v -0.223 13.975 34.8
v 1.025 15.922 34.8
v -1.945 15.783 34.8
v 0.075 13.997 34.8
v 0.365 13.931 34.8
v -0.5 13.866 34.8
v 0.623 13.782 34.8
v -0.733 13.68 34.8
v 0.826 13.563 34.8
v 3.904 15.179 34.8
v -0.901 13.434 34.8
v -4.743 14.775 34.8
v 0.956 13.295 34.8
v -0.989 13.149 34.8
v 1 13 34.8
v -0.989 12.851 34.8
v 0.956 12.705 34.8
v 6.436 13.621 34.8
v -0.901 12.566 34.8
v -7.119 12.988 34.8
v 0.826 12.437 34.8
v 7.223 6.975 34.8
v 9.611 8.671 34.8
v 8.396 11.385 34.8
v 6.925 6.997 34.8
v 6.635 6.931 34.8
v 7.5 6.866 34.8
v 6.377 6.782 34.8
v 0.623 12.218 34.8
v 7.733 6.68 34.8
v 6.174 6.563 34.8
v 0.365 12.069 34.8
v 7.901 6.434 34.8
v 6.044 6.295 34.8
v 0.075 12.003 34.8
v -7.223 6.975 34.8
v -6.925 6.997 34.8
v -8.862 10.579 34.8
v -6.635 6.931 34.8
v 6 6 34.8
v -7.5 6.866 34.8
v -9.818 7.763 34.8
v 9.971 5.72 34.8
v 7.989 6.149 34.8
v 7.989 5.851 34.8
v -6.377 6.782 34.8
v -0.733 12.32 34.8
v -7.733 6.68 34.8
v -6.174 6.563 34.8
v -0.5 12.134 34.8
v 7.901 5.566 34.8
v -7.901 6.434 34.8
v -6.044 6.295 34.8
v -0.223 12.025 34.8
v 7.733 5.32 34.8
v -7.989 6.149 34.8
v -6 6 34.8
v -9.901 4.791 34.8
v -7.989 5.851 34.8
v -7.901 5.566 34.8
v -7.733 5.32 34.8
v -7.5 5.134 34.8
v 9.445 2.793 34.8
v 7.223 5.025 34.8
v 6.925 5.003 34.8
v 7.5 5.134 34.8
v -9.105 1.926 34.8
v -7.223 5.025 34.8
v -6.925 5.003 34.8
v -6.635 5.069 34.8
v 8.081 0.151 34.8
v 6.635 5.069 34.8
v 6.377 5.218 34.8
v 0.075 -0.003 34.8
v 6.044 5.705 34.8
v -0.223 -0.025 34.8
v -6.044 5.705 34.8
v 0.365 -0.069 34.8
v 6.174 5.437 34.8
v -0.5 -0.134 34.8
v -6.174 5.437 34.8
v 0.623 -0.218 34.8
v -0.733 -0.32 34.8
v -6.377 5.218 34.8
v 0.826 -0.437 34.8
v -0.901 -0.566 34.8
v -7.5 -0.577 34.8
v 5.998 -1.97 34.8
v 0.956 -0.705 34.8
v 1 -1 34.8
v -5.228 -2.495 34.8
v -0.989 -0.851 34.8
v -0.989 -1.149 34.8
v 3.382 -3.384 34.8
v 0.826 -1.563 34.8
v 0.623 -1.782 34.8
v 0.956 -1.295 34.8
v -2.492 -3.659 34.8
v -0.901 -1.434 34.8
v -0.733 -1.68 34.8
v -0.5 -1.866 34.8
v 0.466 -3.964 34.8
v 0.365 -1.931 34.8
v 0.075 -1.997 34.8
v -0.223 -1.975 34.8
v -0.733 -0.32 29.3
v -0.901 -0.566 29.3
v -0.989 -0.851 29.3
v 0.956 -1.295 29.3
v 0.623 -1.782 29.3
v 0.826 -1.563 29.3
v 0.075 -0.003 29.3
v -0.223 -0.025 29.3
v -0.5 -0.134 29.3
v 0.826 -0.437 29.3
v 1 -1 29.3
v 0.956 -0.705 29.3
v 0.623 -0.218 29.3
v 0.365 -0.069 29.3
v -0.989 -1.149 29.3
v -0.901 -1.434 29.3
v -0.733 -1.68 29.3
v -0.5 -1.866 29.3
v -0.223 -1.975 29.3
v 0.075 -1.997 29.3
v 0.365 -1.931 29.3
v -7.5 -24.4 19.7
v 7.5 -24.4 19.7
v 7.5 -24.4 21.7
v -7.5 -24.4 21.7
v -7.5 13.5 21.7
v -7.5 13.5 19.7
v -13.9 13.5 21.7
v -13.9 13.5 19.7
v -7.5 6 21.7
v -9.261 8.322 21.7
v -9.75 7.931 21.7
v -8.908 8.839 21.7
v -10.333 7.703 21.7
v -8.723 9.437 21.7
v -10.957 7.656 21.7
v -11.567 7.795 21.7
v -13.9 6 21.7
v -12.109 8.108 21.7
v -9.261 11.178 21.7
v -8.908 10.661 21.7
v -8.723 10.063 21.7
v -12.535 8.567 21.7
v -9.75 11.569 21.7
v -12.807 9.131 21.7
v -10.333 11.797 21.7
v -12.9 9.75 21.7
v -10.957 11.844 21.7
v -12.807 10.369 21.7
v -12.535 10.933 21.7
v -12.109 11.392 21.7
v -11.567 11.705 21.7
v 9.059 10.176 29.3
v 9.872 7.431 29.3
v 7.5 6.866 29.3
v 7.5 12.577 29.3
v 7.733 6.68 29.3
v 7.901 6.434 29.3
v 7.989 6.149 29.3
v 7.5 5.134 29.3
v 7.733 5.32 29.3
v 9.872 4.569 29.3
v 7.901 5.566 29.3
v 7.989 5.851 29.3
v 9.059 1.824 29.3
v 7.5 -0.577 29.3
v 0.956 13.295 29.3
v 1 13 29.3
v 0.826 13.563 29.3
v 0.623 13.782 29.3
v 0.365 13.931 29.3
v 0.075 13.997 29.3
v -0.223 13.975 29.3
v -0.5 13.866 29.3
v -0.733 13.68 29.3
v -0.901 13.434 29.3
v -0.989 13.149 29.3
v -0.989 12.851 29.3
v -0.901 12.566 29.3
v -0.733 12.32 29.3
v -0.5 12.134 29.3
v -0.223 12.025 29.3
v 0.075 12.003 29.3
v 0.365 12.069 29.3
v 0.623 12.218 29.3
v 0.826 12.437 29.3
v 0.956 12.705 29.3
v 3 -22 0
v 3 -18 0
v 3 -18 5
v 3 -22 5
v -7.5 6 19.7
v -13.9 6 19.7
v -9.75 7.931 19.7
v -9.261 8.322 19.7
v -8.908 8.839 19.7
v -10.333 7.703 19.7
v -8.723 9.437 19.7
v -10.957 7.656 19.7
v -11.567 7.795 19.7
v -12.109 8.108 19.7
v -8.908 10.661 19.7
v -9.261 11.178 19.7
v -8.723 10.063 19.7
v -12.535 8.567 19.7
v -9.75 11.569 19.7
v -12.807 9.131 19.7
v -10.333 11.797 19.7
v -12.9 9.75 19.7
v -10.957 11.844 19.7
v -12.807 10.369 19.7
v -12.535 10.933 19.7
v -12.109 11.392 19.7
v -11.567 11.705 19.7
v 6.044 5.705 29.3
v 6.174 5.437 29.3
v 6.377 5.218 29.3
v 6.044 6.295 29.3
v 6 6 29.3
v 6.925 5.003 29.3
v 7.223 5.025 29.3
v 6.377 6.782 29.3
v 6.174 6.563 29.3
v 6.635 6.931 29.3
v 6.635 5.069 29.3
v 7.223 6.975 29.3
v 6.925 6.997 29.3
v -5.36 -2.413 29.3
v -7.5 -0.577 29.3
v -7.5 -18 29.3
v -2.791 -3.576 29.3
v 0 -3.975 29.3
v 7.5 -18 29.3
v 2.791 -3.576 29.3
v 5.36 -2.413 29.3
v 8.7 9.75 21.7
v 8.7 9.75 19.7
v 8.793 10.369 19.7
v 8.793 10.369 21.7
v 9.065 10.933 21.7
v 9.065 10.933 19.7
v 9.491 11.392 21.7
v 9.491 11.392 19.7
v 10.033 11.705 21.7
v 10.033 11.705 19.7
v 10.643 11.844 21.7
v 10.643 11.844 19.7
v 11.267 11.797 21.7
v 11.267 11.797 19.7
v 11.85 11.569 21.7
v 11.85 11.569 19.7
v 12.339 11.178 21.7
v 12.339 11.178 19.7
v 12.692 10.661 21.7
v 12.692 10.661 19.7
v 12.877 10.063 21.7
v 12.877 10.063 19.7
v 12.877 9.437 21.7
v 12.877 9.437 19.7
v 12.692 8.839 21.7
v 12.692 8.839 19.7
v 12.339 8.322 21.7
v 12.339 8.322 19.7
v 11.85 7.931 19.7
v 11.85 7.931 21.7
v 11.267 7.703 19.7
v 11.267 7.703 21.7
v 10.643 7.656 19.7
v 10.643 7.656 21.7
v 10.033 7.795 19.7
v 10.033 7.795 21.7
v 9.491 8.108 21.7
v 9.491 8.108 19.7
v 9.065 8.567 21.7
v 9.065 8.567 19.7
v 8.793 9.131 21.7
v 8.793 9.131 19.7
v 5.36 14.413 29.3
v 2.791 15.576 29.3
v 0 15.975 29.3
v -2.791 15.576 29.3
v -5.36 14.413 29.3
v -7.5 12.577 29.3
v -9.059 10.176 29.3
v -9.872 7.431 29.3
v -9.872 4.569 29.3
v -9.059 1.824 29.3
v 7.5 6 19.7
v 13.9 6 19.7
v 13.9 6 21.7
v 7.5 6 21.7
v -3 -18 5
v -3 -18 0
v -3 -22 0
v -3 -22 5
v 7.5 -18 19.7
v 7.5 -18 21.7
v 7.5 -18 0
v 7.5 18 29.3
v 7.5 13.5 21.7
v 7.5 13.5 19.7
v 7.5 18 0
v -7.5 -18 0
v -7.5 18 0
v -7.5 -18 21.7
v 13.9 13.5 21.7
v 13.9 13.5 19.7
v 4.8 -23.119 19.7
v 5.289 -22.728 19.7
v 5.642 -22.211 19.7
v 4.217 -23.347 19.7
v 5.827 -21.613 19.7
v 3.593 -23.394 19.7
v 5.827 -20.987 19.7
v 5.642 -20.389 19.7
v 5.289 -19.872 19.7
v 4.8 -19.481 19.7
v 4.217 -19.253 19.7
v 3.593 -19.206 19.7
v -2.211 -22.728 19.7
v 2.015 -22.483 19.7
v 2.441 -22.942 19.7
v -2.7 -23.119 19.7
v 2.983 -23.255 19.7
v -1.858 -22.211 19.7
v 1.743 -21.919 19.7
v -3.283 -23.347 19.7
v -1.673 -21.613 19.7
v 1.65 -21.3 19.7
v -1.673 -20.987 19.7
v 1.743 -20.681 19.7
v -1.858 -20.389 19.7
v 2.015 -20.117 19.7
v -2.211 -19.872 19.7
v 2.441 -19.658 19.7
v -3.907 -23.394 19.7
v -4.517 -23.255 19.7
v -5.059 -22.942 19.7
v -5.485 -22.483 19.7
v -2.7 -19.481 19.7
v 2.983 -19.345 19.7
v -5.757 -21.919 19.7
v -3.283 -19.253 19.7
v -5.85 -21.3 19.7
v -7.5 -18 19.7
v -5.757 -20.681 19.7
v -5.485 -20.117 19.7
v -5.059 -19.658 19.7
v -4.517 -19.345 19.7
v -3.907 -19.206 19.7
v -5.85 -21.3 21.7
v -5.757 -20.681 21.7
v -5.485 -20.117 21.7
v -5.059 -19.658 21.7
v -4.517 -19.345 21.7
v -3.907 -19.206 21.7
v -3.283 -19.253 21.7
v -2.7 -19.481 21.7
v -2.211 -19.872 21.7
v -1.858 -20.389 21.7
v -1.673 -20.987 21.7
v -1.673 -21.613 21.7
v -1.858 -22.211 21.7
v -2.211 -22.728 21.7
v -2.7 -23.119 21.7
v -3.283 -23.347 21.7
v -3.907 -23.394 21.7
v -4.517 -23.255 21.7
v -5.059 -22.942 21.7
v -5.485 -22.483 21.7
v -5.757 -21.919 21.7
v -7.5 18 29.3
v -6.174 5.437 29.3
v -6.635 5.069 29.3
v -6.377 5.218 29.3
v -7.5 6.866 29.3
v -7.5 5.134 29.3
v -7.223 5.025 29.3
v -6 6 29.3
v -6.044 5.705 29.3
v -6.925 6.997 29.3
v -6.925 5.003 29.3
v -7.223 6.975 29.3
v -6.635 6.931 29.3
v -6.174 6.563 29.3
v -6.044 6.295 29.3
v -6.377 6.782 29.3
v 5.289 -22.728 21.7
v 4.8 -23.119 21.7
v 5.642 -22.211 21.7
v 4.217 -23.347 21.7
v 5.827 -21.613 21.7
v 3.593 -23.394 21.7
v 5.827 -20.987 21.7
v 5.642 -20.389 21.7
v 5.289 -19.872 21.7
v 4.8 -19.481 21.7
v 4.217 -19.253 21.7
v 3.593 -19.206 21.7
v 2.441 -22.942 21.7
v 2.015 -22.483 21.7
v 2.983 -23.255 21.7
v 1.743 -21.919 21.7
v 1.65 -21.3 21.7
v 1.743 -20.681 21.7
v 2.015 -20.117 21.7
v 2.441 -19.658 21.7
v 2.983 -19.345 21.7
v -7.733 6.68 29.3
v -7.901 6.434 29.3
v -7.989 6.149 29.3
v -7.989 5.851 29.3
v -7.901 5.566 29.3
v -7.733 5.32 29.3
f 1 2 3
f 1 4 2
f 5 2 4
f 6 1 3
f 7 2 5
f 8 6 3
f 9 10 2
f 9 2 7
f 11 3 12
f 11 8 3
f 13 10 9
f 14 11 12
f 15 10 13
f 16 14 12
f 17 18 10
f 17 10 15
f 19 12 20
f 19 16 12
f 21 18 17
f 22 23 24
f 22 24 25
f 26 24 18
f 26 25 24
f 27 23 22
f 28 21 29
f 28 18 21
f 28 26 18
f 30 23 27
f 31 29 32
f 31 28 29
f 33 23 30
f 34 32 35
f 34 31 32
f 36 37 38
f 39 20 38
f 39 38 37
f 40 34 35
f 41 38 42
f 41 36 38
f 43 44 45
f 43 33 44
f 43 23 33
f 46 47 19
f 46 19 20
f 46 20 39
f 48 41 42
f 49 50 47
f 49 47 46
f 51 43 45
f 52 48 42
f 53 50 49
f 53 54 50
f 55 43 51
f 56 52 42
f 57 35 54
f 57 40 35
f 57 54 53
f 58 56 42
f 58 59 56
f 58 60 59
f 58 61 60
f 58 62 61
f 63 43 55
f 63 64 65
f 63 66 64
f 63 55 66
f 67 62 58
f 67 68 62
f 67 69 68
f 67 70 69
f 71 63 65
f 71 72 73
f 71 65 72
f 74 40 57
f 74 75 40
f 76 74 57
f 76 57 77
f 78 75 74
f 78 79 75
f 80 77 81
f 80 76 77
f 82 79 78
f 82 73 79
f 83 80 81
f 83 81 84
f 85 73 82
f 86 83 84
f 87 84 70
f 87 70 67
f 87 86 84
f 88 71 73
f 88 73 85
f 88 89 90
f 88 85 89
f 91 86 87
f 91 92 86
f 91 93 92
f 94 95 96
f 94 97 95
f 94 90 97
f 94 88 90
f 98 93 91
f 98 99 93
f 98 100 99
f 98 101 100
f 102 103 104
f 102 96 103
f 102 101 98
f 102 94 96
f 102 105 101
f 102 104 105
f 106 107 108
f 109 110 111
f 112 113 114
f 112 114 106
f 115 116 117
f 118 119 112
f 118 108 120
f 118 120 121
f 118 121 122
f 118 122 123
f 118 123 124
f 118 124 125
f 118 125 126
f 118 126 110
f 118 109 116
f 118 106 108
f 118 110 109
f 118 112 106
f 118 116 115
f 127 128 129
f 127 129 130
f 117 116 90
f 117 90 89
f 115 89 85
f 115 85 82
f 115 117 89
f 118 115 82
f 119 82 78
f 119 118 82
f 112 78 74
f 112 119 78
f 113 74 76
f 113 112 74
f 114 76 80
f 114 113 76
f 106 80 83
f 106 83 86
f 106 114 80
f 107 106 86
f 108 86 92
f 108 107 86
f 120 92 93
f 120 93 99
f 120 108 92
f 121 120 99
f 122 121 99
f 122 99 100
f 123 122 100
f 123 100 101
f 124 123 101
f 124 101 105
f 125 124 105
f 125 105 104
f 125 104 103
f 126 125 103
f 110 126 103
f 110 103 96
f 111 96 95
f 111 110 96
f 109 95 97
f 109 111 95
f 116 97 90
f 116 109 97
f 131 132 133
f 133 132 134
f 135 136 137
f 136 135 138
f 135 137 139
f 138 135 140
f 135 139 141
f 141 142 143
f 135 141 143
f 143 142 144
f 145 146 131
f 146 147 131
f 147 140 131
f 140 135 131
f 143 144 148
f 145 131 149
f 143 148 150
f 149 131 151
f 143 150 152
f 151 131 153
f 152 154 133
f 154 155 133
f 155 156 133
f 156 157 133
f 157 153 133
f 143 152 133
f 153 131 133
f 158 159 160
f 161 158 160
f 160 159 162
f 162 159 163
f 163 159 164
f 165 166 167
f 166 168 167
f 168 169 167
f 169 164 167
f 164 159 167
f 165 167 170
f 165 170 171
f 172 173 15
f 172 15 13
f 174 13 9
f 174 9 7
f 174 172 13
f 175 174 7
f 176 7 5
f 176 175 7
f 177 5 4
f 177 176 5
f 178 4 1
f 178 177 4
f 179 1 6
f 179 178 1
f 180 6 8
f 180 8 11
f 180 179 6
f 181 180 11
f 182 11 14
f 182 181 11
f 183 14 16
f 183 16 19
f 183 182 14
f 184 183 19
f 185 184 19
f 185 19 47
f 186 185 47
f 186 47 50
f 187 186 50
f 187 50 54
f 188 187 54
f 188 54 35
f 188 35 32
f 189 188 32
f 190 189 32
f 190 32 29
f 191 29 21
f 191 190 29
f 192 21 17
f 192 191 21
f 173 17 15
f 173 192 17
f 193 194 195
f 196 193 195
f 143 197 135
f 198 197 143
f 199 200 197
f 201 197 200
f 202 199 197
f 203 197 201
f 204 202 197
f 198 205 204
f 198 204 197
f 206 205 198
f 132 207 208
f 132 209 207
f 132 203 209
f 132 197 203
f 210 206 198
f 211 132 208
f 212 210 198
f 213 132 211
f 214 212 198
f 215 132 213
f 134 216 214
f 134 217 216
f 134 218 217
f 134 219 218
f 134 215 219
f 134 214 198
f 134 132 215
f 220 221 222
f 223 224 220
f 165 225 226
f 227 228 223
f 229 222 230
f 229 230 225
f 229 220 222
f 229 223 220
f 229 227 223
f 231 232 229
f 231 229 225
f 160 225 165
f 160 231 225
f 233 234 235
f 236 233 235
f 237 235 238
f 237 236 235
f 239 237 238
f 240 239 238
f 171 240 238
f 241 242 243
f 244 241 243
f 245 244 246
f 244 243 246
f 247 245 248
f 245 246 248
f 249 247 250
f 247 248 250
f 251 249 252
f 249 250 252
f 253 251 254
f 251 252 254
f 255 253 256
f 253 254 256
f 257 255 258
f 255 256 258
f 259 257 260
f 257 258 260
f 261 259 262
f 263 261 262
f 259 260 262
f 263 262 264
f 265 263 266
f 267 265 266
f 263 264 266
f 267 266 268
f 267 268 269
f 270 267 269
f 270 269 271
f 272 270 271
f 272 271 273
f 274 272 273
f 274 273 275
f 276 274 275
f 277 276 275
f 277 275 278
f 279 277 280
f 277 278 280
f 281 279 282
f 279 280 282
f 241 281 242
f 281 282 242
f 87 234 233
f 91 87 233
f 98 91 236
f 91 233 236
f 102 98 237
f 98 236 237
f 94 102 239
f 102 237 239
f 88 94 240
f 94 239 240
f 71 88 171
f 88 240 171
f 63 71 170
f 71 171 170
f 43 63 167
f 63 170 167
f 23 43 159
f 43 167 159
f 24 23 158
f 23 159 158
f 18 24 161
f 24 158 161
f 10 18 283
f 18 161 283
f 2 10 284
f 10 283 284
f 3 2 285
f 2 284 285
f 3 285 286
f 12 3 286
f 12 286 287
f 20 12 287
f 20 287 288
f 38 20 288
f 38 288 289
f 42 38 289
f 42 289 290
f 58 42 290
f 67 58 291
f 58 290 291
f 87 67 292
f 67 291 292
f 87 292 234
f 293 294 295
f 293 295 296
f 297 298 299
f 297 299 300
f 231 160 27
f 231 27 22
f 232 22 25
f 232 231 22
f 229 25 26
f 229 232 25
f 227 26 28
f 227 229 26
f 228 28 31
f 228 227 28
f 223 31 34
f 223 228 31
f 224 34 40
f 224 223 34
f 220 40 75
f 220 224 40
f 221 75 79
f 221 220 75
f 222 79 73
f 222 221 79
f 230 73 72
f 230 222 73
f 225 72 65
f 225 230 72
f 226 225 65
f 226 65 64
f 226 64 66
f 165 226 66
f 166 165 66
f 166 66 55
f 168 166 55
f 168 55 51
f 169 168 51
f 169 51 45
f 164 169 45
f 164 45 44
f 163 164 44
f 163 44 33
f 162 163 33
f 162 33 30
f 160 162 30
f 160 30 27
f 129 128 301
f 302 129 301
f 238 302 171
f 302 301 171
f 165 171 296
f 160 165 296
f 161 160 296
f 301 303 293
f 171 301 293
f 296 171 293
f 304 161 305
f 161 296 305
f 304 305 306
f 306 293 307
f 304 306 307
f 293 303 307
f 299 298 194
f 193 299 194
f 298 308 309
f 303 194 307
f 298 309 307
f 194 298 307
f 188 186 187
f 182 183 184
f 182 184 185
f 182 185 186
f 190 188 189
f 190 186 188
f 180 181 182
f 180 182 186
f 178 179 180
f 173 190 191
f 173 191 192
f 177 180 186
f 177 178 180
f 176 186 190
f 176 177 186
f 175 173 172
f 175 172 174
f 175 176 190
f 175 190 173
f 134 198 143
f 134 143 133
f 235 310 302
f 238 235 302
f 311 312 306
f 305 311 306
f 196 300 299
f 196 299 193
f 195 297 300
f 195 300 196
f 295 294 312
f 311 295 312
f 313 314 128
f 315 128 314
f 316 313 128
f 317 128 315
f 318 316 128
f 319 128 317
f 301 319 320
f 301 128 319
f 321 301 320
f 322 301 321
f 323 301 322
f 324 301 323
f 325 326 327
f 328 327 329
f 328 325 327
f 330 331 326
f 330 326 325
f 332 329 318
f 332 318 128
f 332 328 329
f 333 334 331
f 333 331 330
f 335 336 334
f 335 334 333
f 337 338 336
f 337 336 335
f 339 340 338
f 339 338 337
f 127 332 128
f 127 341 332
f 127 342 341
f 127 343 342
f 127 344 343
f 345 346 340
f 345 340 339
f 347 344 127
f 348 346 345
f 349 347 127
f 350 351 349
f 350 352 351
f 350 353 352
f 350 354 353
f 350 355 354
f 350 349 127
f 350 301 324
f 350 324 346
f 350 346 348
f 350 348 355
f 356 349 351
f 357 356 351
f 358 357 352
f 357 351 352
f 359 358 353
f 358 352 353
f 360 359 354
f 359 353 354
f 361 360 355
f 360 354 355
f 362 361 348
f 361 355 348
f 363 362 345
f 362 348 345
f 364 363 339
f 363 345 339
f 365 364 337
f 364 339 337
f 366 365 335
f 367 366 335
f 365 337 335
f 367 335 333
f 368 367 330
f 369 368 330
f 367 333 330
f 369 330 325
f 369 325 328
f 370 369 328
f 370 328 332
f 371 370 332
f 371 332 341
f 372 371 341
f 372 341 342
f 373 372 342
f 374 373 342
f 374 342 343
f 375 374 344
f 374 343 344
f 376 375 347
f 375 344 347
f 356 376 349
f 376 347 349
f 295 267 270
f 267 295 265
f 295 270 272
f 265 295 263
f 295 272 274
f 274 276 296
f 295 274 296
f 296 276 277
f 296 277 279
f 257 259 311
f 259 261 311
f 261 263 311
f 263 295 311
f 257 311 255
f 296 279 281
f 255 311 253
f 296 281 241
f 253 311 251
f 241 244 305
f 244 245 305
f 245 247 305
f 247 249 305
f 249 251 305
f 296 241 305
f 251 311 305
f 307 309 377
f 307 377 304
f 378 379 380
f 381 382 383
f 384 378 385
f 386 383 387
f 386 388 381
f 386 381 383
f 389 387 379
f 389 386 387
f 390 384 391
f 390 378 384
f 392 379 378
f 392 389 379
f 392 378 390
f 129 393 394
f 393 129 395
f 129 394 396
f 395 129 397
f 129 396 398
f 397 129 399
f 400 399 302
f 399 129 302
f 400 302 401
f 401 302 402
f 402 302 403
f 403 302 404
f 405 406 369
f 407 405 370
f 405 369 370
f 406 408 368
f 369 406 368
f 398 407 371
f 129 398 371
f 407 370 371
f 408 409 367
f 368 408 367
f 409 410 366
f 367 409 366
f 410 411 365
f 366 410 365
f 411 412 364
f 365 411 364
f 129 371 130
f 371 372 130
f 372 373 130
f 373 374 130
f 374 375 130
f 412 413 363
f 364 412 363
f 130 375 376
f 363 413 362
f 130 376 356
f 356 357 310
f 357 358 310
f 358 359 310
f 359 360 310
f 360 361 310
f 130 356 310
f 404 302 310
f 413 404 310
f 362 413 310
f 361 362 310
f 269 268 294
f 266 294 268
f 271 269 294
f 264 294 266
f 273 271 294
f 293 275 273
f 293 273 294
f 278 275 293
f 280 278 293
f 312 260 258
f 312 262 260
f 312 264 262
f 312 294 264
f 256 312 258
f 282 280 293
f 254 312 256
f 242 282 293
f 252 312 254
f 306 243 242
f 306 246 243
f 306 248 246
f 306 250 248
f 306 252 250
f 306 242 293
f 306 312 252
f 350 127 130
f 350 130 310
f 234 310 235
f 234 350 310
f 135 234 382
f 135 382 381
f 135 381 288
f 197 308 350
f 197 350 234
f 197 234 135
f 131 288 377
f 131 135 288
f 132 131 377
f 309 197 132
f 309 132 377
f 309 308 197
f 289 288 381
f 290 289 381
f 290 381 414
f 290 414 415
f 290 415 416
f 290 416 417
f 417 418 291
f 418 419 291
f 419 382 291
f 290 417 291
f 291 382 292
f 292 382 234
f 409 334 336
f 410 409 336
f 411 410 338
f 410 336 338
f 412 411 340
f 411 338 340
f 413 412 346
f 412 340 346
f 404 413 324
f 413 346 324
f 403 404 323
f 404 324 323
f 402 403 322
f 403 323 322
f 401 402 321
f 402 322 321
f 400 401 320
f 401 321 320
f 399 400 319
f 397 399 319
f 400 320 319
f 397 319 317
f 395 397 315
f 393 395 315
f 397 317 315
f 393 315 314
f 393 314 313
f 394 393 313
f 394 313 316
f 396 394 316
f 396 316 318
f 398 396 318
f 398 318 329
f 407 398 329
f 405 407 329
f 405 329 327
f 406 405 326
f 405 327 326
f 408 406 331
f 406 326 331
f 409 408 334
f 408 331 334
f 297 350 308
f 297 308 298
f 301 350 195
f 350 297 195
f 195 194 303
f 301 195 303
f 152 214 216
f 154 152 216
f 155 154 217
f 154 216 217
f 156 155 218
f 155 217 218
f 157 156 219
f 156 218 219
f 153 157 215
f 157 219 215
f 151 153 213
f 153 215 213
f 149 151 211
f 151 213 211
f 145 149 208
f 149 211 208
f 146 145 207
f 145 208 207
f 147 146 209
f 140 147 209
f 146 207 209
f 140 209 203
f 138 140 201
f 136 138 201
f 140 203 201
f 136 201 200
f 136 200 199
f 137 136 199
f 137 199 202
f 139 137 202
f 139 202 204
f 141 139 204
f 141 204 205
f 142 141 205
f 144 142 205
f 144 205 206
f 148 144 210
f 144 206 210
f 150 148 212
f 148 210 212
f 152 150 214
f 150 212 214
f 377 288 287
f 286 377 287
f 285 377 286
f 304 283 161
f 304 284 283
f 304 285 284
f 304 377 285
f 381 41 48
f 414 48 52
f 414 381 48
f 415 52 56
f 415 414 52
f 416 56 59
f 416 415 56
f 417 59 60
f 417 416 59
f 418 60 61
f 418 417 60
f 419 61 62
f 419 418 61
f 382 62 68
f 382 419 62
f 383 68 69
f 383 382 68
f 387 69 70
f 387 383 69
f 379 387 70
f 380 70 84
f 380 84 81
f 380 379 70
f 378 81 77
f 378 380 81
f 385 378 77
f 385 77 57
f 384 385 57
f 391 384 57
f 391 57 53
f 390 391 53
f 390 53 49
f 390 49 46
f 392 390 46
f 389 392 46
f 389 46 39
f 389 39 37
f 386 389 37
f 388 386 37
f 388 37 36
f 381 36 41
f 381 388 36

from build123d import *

# Parameters (mm, degrees)
SKETCH_1_W      = 15
SKETCH_1_H      = 36
EXTRUDE_1_DEPTH = 29.3
SKETCH_2_R      = 9.975
SKETCH_2_R_2    = 1
EXTRUDE_2_DEPTH = 5.5
EXTRUDE_START   = -19.7
SKETCH_3_W      = 15
SKETCH_3_H      = 6.4
SKETCH_3_R      = 2.1
SKETCH_3_W_2    = 6.4
SKETCH_3_H_2    = 7.5
EXTRUDE_3_DEPTH = 2
SKETCH_4_W      = 6
SKETCH_4_H      = 5
EXTRUDE_4_DEPTH = 4


with BuildPart() as part:
    # 스케치1 → 보스-돌출1 (new body)
    with BuildSketch(Plane.XY):
        Rectangle(SKETCH_1_W, SKETCH_1_H)
    extrude(amount=EXTRUDE_1_DEPTH)

    # 스케치2 → 보스-돌출2 (add)
    with BuildSketch(Plane.XY.offset(29.3)):
        with Locations(Location((0, 6, 0), (0, 0, 221.246533369))):
            Circle(SKETCH_2_R)
        with Locations((0, 13)):
            Circle(SKETCH_2_R_2, mode=Mode.SUBTRACT)
        with Locations(Location((7, 6, 0), (0, 0, 60))):
            Circle(SKETCH_2_R_2, mode=Mode.SUBTRACT)
        with Locations((0, -1)):
            Circle(SKETCH_2_R_2, mode=Mode.SUBTRACT)
        with Locations(Location((-7, 6, 0), (0, 0, 120))):
            Circle(SKETCH_2_R_2, mode=Mode.SUBTRACT)
    extrude(amount=EXTRUDE_2_DEPTH)

    # 스케치3 → 보스-돌출3 (add)
    # profile 1 of 3: a face of its own
    with BuildSketch(Plane(origin=(0, 0, 0), x_dir=(-1, 0, 0), z_dir=(0, 0, -1)).offset(EXTRUDE_START)):
        with Locations((0, -21.2)):
            Rectangle(SKETCH_3_W, SKETCH_3_H)
        with Locations((-3.75, -21.3)):
            Circle(SKETCH_3_R, mode=Mode.SUBTRACT)
        with Locations((3.75, -21.3)):
            Circle(SKETCH_3_R, mode=Mode.SUBTRACT)
    # profile 2 of 3: a face of its own
    with BuildSketch(Plane(origin=(0, 0, 0), x_dir=(-1, 0, 0), z_dir=(0, 0, -1)).offset(EXTRUDE_START)):
        with Locations((-10.7, 9.75)):
            Rectangle(SKETCH_3_W_2, SKETCH_3_H_2)
        with Locations((-10.8, 9.75)):
            Circle(SKETCH_3_R, mode=Mode.SUBTRACT)
    # profile 3 of 3: a face of its own
    with BuildSketch(Plane(origin=(0, 0, 0), x_dir=(-1, 0, 0), z_dir=(0, 0, -1)).offset(EXTRUDE_START)):
        with Locations((10.7, 9.75)):
            Rectangle(SKETCH_3_W_2, SKETCH_3_H_2)
        with Locations((10.8, 9.75)):
            Circle(SKETCH_3_R, mode=Mode.SUBTRACT)
    extrude(amount=-EXTRUDE_3_DEPTH)

    # 스케치4 → 보스-돌출4 (add)
    with BuildSketch(Plane.XZ.offset(18)):
        with Locations((0, 2.5)):
            Rectangle(SKETCH_4_W, SKETCH_4_H)
    extrude(amount=EXTRUDE_4_DEPTH)


solid = part.part
